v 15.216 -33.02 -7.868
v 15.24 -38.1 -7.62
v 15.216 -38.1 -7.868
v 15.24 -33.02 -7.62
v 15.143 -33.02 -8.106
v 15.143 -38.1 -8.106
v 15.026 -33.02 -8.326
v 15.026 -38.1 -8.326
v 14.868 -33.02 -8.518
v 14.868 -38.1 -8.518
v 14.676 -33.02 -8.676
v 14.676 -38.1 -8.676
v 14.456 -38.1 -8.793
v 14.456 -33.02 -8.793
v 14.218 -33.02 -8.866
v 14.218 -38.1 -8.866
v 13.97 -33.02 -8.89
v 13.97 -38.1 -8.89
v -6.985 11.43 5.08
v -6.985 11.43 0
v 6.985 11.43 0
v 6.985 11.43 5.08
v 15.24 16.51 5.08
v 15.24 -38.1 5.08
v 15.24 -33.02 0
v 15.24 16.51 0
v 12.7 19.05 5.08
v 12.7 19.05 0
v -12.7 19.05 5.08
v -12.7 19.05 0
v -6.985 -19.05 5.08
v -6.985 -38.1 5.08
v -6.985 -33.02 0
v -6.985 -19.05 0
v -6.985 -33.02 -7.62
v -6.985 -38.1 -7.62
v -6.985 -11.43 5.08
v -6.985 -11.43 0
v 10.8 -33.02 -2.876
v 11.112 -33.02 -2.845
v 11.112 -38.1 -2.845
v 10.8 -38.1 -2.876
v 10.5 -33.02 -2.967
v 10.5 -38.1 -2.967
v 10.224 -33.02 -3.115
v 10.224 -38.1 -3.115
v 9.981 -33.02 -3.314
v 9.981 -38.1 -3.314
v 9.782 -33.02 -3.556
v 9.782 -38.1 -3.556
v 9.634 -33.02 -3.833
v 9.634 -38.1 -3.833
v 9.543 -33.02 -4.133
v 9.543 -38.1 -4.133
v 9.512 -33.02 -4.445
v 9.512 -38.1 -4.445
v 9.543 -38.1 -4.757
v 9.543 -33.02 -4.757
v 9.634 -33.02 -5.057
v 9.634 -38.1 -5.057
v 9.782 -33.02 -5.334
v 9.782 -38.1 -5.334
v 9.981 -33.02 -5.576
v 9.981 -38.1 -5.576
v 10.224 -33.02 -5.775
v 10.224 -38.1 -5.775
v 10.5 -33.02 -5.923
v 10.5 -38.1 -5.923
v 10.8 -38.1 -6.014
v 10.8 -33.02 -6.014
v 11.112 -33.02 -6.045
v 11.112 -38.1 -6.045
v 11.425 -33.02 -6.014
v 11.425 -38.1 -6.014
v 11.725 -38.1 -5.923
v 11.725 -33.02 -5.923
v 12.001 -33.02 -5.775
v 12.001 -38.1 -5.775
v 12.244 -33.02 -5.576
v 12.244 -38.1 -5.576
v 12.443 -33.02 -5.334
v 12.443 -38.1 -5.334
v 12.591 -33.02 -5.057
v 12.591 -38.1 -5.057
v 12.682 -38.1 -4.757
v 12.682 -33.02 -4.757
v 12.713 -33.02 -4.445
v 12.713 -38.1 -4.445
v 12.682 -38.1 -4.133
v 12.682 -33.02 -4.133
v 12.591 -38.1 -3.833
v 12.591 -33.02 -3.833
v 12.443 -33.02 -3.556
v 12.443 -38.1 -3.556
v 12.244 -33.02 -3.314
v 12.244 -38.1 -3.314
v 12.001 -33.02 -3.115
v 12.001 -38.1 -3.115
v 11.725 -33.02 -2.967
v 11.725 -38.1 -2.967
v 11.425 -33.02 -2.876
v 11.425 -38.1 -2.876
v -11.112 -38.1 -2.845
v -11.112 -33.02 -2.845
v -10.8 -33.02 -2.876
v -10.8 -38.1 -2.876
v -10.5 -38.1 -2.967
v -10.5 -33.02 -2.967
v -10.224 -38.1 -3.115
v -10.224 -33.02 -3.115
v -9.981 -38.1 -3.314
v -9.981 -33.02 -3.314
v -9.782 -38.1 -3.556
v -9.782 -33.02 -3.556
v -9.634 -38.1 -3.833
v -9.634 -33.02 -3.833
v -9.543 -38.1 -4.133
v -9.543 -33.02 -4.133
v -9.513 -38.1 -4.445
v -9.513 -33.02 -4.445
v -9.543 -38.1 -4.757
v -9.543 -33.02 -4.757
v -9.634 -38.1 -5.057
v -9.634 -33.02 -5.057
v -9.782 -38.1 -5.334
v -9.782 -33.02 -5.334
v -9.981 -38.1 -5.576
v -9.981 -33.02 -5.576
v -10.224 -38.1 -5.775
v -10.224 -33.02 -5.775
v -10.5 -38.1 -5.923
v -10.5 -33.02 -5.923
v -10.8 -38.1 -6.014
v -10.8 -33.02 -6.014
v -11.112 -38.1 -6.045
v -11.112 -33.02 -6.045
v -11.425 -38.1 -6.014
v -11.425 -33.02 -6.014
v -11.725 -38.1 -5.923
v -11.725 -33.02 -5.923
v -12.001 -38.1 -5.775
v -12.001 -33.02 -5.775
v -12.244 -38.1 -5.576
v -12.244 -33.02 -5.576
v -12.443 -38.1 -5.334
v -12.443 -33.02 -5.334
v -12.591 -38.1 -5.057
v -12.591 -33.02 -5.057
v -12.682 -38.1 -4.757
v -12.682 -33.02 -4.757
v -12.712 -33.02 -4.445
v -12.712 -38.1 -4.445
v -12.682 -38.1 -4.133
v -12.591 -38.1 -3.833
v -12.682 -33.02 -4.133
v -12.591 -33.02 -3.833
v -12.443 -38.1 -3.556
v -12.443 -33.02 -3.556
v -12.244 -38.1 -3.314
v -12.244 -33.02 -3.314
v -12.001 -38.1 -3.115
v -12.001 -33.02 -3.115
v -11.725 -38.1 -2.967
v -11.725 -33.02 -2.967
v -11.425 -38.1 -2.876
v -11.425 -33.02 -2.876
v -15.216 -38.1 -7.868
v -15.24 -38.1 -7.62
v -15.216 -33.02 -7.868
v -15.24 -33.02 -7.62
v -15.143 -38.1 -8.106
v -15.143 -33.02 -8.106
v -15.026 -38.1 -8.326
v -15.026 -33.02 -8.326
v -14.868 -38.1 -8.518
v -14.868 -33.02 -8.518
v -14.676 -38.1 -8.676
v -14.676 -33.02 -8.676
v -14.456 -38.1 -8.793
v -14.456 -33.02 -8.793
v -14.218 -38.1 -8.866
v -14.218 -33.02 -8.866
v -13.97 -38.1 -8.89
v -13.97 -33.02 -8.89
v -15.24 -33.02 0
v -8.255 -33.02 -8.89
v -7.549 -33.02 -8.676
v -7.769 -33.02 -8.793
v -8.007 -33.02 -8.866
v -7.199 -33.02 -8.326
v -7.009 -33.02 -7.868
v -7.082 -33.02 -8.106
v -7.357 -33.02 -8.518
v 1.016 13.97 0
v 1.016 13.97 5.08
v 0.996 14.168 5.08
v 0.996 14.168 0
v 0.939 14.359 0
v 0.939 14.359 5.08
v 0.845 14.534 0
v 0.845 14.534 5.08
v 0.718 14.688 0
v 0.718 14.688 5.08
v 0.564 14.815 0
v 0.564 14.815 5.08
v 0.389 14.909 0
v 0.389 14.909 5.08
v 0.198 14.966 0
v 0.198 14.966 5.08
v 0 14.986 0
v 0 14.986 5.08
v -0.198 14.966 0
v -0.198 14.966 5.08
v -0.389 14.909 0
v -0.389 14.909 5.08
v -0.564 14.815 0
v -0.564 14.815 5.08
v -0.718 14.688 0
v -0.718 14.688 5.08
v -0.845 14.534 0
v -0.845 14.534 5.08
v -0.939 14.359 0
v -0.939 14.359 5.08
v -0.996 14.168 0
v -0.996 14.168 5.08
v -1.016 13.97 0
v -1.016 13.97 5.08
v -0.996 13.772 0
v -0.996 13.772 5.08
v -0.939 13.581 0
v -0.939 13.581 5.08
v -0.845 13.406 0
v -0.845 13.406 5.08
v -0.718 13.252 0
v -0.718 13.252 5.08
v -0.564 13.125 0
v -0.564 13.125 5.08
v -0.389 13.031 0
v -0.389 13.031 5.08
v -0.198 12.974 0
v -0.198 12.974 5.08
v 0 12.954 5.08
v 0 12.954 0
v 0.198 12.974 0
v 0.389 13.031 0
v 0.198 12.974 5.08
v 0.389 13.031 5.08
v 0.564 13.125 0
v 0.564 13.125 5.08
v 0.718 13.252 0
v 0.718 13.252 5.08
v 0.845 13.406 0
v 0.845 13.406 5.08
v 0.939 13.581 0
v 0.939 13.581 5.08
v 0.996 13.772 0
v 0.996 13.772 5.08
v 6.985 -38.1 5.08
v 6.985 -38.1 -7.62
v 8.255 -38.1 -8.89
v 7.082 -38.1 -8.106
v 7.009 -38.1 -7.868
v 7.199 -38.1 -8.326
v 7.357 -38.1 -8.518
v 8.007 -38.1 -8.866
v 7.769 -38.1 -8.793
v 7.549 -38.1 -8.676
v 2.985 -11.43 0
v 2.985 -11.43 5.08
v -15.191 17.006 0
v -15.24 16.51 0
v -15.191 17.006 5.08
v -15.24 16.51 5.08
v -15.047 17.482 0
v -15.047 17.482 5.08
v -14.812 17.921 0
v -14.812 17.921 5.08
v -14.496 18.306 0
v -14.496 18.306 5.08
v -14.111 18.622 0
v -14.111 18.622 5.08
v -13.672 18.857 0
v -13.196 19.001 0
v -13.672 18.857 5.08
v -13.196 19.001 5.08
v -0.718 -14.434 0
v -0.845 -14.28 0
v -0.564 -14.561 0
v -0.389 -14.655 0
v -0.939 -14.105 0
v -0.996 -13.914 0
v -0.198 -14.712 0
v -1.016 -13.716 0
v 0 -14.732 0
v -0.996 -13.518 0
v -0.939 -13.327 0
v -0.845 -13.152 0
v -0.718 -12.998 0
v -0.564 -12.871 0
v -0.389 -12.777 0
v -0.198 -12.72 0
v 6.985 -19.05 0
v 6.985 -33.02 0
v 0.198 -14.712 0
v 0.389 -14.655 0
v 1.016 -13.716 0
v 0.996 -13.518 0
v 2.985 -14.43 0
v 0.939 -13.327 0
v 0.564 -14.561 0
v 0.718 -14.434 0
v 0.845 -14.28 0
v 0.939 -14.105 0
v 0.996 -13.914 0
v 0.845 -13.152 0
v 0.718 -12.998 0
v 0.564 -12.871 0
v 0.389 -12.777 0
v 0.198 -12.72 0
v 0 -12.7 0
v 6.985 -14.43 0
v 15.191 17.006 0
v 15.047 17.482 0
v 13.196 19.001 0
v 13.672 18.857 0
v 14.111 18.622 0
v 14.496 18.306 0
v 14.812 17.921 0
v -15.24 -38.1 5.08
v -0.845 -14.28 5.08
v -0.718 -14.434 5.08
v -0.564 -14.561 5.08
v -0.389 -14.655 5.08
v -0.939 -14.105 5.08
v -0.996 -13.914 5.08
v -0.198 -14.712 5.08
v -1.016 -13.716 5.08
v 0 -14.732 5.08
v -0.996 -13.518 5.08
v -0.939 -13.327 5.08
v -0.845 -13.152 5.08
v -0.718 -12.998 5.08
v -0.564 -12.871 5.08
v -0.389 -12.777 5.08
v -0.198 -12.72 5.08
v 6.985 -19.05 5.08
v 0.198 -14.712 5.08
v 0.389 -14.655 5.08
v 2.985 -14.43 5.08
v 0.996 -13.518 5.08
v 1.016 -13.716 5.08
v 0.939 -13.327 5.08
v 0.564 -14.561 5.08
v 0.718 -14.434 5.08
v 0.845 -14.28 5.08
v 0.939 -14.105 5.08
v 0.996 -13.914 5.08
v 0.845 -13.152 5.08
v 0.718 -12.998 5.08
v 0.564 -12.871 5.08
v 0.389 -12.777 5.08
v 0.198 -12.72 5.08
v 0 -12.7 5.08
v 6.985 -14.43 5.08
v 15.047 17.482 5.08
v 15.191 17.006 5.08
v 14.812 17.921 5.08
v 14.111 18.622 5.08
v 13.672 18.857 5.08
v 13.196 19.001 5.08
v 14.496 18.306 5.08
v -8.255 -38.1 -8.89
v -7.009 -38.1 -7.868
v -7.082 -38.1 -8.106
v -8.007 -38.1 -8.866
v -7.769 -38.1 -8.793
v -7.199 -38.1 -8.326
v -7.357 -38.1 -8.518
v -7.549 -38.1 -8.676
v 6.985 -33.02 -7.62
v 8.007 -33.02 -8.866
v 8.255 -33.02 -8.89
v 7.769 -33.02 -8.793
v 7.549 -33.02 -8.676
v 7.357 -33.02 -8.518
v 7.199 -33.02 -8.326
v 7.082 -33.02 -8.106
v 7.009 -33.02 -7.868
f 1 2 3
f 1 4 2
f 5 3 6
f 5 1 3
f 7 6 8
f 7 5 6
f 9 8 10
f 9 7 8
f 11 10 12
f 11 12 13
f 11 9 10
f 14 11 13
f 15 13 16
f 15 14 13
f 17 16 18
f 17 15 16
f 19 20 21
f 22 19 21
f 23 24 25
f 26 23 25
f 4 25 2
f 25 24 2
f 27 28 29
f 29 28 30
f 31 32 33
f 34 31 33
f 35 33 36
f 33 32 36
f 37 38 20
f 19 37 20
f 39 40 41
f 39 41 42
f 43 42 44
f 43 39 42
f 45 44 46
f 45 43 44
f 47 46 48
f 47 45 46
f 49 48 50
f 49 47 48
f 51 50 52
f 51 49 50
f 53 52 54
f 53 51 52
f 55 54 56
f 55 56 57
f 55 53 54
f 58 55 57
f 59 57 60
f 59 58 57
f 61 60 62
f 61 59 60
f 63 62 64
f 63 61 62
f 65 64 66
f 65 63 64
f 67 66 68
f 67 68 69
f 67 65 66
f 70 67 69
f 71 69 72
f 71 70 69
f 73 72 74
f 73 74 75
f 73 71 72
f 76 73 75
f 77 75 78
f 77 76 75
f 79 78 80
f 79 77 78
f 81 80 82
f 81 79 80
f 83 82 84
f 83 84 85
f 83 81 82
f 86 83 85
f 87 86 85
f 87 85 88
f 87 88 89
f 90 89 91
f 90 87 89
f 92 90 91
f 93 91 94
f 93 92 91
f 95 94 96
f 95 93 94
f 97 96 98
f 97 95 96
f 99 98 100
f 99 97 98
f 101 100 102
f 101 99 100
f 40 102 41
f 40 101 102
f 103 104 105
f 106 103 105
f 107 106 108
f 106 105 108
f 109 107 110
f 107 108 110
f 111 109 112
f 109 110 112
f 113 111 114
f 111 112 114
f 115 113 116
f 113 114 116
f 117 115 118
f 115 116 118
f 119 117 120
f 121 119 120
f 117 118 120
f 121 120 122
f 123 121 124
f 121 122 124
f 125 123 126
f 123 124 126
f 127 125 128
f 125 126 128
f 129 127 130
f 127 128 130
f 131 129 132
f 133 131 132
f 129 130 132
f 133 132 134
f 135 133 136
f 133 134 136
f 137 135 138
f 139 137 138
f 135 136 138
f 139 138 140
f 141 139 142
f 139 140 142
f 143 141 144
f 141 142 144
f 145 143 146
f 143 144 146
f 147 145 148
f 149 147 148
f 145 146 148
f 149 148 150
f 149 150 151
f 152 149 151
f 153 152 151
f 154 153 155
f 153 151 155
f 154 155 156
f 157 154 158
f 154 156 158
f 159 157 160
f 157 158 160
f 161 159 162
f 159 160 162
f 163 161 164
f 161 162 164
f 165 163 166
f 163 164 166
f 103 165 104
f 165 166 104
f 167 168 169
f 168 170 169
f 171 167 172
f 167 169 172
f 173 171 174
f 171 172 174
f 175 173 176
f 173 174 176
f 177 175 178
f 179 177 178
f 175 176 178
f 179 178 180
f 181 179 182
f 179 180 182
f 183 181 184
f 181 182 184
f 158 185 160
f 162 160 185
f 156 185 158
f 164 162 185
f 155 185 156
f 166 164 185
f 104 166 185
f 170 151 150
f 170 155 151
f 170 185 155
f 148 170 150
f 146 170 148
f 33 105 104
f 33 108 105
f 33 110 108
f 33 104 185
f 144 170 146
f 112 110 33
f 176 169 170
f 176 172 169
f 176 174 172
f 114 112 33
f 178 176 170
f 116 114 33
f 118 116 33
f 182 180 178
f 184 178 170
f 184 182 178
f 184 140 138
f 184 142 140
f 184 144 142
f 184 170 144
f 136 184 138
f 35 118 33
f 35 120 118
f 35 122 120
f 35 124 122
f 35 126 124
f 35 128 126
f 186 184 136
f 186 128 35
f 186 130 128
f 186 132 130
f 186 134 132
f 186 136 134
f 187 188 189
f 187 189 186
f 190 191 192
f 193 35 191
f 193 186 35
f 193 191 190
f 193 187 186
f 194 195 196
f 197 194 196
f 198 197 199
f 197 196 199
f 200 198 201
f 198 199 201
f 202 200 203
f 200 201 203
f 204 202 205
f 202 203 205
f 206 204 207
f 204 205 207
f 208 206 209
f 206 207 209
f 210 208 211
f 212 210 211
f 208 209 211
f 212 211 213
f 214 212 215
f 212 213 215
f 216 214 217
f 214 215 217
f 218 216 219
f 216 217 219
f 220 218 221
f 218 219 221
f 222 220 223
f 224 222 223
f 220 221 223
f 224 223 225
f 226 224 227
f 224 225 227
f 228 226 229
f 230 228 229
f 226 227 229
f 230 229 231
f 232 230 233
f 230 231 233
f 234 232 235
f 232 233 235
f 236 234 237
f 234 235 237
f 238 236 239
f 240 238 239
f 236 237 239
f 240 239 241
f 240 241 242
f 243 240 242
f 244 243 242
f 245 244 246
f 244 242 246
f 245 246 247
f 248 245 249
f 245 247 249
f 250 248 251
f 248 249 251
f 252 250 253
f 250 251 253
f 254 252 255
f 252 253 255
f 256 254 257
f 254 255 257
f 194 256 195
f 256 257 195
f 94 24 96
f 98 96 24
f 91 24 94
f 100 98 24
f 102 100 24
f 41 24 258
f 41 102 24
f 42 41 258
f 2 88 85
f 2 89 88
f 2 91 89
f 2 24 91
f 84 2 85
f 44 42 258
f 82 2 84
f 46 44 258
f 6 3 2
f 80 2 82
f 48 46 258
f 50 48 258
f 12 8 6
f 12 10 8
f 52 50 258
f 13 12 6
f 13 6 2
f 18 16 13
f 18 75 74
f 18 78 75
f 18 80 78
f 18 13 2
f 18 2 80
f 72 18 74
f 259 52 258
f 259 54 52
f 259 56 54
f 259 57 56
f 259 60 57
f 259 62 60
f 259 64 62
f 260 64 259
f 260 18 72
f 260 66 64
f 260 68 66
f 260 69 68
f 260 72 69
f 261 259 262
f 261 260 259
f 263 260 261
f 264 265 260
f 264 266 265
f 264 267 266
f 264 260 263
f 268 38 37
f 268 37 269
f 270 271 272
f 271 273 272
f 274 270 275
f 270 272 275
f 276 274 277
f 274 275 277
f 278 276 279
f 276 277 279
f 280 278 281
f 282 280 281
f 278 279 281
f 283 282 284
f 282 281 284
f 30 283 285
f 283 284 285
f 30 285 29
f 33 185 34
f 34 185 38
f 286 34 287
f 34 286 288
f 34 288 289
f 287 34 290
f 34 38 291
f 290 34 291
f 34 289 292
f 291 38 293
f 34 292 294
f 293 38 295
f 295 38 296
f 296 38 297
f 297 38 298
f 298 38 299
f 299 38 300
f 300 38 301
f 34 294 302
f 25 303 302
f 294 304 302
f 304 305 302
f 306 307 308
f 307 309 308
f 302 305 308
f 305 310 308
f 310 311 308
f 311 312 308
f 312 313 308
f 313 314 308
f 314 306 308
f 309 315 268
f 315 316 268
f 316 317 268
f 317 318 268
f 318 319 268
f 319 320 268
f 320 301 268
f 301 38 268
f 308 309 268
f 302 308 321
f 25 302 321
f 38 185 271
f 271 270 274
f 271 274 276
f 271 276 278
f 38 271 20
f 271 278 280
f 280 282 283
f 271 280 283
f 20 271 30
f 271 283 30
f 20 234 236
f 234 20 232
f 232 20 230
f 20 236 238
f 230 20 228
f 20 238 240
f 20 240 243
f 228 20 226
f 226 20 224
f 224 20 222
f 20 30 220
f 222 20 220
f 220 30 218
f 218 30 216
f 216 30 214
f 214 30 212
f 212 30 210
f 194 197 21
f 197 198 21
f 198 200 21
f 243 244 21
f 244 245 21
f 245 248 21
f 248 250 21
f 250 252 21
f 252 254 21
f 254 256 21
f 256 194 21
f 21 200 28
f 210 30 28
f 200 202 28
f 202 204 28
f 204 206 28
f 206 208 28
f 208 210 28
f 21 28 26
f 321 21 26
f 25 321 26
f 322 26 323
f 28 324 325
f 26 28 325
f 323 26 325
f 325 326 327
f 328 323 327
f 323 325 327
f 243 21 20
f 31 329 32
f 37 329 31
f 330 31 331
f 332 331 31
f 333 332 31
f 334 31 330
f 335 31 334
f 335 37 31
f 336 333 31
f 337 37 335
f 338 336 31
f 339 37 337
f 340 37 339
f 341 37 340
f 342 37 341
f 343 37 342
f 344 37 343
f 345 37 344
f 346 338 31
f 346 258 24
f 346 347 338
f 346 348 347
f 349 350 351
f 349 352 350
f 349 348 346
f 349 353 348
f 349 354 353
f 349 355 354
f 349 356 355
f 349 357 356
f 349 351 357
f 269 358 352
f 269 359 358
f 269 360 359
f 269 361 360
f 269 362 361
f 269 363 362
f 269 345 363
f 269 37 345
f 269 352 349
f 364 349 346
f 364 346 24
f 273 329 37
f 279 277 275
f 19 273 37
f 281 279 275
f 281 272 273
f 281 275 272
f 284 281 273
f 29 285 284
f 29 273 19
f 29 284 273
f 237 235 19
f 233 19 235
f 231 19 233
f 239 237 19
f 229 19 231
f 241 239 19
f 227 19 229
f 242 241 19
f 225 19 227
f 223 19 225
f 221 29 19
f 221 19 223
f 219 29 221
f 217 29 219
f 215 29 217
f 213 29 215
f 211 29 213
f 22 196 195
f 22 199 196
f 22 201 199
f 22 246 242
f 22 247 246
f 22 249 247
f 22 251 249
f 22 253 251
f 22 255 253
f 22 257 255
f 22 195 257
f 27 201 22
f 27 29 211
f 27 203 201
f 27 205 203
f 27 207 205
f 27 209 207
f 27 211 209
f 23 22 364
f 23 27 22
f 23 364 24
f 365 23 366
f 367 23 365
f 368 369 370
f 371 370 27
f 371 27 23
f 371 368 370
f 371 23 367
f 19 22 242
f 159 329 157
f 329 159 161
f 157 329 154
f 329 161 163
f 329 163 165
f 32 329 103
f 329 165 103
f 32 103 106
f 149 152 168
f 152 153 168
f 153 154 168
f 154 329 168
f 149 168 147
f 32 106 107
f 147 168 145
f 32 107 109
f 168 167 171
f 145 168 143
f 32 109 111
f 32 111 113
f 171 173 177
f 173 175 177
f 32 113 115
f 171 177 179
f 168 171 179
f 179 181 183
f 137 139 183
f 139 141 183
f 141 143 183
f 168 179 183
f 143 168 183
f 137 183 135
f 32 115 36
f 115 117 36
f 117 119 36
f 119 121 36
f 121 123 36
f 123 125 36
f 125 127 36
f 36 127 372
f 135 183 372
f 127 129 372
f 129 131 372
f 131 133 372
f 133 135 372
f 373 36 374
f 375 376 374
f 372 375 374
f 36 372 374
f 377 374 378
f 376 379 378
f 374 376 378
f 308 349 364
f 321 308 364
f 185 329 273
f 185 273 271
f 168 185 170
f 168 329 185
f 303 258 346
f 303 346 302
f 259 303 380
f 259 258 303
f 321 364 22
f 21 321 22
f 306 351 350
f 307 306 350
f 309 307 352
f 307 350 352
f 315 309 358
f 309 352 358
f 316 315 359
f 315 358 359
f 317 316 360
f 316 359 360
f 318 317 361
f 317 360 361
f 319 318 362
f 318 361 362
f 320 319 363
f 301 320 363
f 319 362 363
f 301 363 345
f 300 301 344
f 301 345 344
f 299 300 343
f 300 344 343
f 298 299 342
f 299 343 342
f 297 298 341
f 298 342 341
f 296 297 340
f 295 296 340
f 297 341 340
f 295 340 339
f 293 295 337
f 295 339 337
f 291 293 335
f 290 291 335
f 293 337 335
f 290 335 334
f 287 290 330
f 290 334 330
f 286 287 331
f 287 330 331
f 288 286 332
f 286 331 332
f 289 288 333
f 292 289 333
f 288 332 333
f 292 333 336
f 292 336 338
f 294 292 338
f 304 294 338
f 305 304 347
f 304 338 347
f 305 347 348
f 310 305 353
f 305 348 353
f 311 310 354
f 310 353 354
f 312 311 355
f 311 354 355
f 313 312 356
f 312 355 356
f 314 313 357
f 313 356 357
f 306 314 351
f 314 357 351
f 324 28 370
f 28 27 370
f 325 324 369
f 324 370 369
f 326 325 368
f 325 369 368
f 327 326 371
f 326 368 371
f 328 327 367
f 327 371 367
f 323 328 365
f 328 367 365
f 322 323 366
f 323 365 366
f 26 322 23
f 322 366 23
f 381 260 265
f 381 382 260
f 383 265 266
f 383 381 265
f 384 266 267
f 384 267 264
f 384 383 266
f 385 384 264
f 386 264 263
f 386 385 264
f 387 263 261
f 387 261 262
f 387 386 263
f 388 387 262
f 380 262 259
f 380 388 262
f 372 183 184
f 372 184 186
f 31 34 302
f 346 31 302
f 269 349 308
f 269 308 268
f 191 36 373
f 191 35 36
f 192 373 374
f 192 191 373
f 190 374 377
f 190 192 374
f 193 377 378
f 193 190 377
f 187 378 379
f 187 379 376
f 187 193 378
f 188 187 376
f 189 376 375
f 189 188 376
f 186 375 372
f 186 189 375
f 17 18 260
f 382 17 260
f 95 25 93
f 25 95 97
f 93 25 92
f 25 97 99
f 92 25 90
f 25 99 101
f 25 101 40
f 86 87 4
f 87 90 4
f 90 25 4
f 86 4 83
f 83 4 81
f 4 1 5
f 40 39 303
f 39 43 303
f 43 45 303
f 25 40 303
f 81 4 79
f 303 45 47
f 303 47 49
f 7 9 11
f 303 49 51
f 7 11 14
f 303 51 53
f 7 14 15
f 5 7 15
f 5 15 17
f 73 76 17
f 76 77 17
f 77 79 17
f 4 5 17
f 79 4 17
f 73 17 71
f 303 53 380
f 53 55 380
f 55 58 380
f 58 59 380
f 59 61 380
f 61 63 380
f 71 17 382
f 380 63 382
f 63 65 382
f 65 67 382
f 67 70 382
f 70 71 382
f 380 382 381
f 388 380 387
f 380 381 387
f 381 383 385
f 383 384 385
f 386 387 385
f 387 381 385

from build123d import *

# Parameters (mm, degrees)
SKETCH1_W           = 8.255
SKETCH1_H           = 19.05
SKETCH1_W_2         = 13.97
SKETCH1_H_2         = 22.86
BOSS_EXTRUDE1_DEPTH = 5.08
FILLET1_R           = 2.54
SKETCH3_W           = 8.255
SKETCH3_H           = 8.89
BOSS_EXTRUDE2_DEPTH = 5.08
SKETCH5_R           = 1.016
CUT_EXTRUDE1_DEPTH  = 5.08
SKETCH6_R           = 1.6
CUT_EXTRUDE2_DEPTH  = 5.08
FILLET2_R           = 1.27
SKETCH7_W           = 4
SKETCH7_H           = 3
CUT_EXTRUDE3_DEPTH  = 44.347762341


with BuildPart() as part:
    # Sketch1 → Boss-Extrude1 (new body)
    # profile 1 of 3: a face of its own
    with BuildSketch(Plane.XY):
        with Locations((-11.1125, -28.575)):
            Rectangle(SKETCH1_W, SKETCH1_H)
    # profile 2 of 3: a face of its own
    with BuildSketch(Plane.XY):
        Polygon((-15.24, 19.05), (-15.24, -19.05), (-6.985, -19.05), (6.985, -19.05), (15.24, -19.05), (15.24, 19.05), align=None)
        Rectangle(SKETCH1_W_2, SKETCH1_H_2, mode=Mode.SUBTRACT)
    # profile 3 of 3: a face of its own
    with BuildSketch(Plane.XY):
        with Locations((11.1125, -28.575)):
            Rectangle(SKETCH1_W, SKETCH1_H)
    extrude(amount=BOSS_EXTRUDE1_DEPTH)

    # Fillet1
    fillet1_edges = [part.edges().sort_by_distance(p)[0] for p in [
        (-15.24, 19.05, 2.54),
        (15.24, 19.05, 2.54),
    ]]
    fillet(fillet1_edges, radius=FILLET1_R)

    # Sketch3 → Boss-Extrude2 (add)
    with BuildSketch(Plane(origin=(0, -38.1, 0), x_dir=(1, 0, 0), z_dir=(0, 1, 0))):
        with Locations((-11.1125, 4.445)):
            Rectangle(SKETCH3_W, SKETCH3_H)
    boss_extrude2 = extrude(amount=BOSS_EXTRUDE2_DEPTH)

    # Sketch5 → Cut-Extrude1 (cut)
    with BuildSketch(Plane.XY.offset(5.08)):
        with Locations((0, 13.97)):
            Circle(SKETCH5_R)
        with Locations((0, -13.716)):
            Circle(SKETCH5_R)
    extrude(amount=-CUT_EXTRUDE1_DEPTH, mode=Mode.SUBTRACT)

    # Sketch6 → Cut-Extrude2 (cut)
    with BuildSketch(Plane(origin=(0, -33.02, 0), x_dir=(1, 0, 0), z_dir=(0, 1, 0))):
        with Locations(Location((-11.1125, 4.445, 0), (0, 0, 270))):
            Circle(SKETCH6_R)
    cut_extrude2 = extrude(amount=-CUT_EXTRUDE2_DEPTH, mode=Mode.SUBTRACT)

    # Mirror2: Boss-Extrude2, Cut-Extrude2 across plane
    add(boss_extrude2.mirror(Plane(origin=(0, 0, 0), x_dir=(0, 0, 1), z_dir=(1, 0, 0))))
    add(cut_extrude2.mirror(Plane(origin=(0, 0, 0), x_dir=(0, 0, 1), z_dir=(1, 0, 0))), mode=Mode.SUBTRACT)

    # Fillet2
    fillet2_edges = [part.edges().sort_by_distance(p)[0] for p in [
        (15.24, -35.56, -8.89),
        (6.985, -35.56, -8.89),
        (-6.985, -35.56, -8.89),
        (-15.24, -35.56, -8.89),
    ]]
    fillet(fillet2_edges, radius=FILLET2_R)

    # Sketch7 → Cut-Extrude3 (cut, through all)
    with BuildSketch(Plane.XY.offset(5.08)):
        with Locations((4.985, -12.93)):
            Rectangle(SKETCH7_W, SKETCH7_H)
    extrude(amount=-CUT_EXTRUDE3_DEPTH, mode=Mode.SUBTRACT)


solid = part.part
